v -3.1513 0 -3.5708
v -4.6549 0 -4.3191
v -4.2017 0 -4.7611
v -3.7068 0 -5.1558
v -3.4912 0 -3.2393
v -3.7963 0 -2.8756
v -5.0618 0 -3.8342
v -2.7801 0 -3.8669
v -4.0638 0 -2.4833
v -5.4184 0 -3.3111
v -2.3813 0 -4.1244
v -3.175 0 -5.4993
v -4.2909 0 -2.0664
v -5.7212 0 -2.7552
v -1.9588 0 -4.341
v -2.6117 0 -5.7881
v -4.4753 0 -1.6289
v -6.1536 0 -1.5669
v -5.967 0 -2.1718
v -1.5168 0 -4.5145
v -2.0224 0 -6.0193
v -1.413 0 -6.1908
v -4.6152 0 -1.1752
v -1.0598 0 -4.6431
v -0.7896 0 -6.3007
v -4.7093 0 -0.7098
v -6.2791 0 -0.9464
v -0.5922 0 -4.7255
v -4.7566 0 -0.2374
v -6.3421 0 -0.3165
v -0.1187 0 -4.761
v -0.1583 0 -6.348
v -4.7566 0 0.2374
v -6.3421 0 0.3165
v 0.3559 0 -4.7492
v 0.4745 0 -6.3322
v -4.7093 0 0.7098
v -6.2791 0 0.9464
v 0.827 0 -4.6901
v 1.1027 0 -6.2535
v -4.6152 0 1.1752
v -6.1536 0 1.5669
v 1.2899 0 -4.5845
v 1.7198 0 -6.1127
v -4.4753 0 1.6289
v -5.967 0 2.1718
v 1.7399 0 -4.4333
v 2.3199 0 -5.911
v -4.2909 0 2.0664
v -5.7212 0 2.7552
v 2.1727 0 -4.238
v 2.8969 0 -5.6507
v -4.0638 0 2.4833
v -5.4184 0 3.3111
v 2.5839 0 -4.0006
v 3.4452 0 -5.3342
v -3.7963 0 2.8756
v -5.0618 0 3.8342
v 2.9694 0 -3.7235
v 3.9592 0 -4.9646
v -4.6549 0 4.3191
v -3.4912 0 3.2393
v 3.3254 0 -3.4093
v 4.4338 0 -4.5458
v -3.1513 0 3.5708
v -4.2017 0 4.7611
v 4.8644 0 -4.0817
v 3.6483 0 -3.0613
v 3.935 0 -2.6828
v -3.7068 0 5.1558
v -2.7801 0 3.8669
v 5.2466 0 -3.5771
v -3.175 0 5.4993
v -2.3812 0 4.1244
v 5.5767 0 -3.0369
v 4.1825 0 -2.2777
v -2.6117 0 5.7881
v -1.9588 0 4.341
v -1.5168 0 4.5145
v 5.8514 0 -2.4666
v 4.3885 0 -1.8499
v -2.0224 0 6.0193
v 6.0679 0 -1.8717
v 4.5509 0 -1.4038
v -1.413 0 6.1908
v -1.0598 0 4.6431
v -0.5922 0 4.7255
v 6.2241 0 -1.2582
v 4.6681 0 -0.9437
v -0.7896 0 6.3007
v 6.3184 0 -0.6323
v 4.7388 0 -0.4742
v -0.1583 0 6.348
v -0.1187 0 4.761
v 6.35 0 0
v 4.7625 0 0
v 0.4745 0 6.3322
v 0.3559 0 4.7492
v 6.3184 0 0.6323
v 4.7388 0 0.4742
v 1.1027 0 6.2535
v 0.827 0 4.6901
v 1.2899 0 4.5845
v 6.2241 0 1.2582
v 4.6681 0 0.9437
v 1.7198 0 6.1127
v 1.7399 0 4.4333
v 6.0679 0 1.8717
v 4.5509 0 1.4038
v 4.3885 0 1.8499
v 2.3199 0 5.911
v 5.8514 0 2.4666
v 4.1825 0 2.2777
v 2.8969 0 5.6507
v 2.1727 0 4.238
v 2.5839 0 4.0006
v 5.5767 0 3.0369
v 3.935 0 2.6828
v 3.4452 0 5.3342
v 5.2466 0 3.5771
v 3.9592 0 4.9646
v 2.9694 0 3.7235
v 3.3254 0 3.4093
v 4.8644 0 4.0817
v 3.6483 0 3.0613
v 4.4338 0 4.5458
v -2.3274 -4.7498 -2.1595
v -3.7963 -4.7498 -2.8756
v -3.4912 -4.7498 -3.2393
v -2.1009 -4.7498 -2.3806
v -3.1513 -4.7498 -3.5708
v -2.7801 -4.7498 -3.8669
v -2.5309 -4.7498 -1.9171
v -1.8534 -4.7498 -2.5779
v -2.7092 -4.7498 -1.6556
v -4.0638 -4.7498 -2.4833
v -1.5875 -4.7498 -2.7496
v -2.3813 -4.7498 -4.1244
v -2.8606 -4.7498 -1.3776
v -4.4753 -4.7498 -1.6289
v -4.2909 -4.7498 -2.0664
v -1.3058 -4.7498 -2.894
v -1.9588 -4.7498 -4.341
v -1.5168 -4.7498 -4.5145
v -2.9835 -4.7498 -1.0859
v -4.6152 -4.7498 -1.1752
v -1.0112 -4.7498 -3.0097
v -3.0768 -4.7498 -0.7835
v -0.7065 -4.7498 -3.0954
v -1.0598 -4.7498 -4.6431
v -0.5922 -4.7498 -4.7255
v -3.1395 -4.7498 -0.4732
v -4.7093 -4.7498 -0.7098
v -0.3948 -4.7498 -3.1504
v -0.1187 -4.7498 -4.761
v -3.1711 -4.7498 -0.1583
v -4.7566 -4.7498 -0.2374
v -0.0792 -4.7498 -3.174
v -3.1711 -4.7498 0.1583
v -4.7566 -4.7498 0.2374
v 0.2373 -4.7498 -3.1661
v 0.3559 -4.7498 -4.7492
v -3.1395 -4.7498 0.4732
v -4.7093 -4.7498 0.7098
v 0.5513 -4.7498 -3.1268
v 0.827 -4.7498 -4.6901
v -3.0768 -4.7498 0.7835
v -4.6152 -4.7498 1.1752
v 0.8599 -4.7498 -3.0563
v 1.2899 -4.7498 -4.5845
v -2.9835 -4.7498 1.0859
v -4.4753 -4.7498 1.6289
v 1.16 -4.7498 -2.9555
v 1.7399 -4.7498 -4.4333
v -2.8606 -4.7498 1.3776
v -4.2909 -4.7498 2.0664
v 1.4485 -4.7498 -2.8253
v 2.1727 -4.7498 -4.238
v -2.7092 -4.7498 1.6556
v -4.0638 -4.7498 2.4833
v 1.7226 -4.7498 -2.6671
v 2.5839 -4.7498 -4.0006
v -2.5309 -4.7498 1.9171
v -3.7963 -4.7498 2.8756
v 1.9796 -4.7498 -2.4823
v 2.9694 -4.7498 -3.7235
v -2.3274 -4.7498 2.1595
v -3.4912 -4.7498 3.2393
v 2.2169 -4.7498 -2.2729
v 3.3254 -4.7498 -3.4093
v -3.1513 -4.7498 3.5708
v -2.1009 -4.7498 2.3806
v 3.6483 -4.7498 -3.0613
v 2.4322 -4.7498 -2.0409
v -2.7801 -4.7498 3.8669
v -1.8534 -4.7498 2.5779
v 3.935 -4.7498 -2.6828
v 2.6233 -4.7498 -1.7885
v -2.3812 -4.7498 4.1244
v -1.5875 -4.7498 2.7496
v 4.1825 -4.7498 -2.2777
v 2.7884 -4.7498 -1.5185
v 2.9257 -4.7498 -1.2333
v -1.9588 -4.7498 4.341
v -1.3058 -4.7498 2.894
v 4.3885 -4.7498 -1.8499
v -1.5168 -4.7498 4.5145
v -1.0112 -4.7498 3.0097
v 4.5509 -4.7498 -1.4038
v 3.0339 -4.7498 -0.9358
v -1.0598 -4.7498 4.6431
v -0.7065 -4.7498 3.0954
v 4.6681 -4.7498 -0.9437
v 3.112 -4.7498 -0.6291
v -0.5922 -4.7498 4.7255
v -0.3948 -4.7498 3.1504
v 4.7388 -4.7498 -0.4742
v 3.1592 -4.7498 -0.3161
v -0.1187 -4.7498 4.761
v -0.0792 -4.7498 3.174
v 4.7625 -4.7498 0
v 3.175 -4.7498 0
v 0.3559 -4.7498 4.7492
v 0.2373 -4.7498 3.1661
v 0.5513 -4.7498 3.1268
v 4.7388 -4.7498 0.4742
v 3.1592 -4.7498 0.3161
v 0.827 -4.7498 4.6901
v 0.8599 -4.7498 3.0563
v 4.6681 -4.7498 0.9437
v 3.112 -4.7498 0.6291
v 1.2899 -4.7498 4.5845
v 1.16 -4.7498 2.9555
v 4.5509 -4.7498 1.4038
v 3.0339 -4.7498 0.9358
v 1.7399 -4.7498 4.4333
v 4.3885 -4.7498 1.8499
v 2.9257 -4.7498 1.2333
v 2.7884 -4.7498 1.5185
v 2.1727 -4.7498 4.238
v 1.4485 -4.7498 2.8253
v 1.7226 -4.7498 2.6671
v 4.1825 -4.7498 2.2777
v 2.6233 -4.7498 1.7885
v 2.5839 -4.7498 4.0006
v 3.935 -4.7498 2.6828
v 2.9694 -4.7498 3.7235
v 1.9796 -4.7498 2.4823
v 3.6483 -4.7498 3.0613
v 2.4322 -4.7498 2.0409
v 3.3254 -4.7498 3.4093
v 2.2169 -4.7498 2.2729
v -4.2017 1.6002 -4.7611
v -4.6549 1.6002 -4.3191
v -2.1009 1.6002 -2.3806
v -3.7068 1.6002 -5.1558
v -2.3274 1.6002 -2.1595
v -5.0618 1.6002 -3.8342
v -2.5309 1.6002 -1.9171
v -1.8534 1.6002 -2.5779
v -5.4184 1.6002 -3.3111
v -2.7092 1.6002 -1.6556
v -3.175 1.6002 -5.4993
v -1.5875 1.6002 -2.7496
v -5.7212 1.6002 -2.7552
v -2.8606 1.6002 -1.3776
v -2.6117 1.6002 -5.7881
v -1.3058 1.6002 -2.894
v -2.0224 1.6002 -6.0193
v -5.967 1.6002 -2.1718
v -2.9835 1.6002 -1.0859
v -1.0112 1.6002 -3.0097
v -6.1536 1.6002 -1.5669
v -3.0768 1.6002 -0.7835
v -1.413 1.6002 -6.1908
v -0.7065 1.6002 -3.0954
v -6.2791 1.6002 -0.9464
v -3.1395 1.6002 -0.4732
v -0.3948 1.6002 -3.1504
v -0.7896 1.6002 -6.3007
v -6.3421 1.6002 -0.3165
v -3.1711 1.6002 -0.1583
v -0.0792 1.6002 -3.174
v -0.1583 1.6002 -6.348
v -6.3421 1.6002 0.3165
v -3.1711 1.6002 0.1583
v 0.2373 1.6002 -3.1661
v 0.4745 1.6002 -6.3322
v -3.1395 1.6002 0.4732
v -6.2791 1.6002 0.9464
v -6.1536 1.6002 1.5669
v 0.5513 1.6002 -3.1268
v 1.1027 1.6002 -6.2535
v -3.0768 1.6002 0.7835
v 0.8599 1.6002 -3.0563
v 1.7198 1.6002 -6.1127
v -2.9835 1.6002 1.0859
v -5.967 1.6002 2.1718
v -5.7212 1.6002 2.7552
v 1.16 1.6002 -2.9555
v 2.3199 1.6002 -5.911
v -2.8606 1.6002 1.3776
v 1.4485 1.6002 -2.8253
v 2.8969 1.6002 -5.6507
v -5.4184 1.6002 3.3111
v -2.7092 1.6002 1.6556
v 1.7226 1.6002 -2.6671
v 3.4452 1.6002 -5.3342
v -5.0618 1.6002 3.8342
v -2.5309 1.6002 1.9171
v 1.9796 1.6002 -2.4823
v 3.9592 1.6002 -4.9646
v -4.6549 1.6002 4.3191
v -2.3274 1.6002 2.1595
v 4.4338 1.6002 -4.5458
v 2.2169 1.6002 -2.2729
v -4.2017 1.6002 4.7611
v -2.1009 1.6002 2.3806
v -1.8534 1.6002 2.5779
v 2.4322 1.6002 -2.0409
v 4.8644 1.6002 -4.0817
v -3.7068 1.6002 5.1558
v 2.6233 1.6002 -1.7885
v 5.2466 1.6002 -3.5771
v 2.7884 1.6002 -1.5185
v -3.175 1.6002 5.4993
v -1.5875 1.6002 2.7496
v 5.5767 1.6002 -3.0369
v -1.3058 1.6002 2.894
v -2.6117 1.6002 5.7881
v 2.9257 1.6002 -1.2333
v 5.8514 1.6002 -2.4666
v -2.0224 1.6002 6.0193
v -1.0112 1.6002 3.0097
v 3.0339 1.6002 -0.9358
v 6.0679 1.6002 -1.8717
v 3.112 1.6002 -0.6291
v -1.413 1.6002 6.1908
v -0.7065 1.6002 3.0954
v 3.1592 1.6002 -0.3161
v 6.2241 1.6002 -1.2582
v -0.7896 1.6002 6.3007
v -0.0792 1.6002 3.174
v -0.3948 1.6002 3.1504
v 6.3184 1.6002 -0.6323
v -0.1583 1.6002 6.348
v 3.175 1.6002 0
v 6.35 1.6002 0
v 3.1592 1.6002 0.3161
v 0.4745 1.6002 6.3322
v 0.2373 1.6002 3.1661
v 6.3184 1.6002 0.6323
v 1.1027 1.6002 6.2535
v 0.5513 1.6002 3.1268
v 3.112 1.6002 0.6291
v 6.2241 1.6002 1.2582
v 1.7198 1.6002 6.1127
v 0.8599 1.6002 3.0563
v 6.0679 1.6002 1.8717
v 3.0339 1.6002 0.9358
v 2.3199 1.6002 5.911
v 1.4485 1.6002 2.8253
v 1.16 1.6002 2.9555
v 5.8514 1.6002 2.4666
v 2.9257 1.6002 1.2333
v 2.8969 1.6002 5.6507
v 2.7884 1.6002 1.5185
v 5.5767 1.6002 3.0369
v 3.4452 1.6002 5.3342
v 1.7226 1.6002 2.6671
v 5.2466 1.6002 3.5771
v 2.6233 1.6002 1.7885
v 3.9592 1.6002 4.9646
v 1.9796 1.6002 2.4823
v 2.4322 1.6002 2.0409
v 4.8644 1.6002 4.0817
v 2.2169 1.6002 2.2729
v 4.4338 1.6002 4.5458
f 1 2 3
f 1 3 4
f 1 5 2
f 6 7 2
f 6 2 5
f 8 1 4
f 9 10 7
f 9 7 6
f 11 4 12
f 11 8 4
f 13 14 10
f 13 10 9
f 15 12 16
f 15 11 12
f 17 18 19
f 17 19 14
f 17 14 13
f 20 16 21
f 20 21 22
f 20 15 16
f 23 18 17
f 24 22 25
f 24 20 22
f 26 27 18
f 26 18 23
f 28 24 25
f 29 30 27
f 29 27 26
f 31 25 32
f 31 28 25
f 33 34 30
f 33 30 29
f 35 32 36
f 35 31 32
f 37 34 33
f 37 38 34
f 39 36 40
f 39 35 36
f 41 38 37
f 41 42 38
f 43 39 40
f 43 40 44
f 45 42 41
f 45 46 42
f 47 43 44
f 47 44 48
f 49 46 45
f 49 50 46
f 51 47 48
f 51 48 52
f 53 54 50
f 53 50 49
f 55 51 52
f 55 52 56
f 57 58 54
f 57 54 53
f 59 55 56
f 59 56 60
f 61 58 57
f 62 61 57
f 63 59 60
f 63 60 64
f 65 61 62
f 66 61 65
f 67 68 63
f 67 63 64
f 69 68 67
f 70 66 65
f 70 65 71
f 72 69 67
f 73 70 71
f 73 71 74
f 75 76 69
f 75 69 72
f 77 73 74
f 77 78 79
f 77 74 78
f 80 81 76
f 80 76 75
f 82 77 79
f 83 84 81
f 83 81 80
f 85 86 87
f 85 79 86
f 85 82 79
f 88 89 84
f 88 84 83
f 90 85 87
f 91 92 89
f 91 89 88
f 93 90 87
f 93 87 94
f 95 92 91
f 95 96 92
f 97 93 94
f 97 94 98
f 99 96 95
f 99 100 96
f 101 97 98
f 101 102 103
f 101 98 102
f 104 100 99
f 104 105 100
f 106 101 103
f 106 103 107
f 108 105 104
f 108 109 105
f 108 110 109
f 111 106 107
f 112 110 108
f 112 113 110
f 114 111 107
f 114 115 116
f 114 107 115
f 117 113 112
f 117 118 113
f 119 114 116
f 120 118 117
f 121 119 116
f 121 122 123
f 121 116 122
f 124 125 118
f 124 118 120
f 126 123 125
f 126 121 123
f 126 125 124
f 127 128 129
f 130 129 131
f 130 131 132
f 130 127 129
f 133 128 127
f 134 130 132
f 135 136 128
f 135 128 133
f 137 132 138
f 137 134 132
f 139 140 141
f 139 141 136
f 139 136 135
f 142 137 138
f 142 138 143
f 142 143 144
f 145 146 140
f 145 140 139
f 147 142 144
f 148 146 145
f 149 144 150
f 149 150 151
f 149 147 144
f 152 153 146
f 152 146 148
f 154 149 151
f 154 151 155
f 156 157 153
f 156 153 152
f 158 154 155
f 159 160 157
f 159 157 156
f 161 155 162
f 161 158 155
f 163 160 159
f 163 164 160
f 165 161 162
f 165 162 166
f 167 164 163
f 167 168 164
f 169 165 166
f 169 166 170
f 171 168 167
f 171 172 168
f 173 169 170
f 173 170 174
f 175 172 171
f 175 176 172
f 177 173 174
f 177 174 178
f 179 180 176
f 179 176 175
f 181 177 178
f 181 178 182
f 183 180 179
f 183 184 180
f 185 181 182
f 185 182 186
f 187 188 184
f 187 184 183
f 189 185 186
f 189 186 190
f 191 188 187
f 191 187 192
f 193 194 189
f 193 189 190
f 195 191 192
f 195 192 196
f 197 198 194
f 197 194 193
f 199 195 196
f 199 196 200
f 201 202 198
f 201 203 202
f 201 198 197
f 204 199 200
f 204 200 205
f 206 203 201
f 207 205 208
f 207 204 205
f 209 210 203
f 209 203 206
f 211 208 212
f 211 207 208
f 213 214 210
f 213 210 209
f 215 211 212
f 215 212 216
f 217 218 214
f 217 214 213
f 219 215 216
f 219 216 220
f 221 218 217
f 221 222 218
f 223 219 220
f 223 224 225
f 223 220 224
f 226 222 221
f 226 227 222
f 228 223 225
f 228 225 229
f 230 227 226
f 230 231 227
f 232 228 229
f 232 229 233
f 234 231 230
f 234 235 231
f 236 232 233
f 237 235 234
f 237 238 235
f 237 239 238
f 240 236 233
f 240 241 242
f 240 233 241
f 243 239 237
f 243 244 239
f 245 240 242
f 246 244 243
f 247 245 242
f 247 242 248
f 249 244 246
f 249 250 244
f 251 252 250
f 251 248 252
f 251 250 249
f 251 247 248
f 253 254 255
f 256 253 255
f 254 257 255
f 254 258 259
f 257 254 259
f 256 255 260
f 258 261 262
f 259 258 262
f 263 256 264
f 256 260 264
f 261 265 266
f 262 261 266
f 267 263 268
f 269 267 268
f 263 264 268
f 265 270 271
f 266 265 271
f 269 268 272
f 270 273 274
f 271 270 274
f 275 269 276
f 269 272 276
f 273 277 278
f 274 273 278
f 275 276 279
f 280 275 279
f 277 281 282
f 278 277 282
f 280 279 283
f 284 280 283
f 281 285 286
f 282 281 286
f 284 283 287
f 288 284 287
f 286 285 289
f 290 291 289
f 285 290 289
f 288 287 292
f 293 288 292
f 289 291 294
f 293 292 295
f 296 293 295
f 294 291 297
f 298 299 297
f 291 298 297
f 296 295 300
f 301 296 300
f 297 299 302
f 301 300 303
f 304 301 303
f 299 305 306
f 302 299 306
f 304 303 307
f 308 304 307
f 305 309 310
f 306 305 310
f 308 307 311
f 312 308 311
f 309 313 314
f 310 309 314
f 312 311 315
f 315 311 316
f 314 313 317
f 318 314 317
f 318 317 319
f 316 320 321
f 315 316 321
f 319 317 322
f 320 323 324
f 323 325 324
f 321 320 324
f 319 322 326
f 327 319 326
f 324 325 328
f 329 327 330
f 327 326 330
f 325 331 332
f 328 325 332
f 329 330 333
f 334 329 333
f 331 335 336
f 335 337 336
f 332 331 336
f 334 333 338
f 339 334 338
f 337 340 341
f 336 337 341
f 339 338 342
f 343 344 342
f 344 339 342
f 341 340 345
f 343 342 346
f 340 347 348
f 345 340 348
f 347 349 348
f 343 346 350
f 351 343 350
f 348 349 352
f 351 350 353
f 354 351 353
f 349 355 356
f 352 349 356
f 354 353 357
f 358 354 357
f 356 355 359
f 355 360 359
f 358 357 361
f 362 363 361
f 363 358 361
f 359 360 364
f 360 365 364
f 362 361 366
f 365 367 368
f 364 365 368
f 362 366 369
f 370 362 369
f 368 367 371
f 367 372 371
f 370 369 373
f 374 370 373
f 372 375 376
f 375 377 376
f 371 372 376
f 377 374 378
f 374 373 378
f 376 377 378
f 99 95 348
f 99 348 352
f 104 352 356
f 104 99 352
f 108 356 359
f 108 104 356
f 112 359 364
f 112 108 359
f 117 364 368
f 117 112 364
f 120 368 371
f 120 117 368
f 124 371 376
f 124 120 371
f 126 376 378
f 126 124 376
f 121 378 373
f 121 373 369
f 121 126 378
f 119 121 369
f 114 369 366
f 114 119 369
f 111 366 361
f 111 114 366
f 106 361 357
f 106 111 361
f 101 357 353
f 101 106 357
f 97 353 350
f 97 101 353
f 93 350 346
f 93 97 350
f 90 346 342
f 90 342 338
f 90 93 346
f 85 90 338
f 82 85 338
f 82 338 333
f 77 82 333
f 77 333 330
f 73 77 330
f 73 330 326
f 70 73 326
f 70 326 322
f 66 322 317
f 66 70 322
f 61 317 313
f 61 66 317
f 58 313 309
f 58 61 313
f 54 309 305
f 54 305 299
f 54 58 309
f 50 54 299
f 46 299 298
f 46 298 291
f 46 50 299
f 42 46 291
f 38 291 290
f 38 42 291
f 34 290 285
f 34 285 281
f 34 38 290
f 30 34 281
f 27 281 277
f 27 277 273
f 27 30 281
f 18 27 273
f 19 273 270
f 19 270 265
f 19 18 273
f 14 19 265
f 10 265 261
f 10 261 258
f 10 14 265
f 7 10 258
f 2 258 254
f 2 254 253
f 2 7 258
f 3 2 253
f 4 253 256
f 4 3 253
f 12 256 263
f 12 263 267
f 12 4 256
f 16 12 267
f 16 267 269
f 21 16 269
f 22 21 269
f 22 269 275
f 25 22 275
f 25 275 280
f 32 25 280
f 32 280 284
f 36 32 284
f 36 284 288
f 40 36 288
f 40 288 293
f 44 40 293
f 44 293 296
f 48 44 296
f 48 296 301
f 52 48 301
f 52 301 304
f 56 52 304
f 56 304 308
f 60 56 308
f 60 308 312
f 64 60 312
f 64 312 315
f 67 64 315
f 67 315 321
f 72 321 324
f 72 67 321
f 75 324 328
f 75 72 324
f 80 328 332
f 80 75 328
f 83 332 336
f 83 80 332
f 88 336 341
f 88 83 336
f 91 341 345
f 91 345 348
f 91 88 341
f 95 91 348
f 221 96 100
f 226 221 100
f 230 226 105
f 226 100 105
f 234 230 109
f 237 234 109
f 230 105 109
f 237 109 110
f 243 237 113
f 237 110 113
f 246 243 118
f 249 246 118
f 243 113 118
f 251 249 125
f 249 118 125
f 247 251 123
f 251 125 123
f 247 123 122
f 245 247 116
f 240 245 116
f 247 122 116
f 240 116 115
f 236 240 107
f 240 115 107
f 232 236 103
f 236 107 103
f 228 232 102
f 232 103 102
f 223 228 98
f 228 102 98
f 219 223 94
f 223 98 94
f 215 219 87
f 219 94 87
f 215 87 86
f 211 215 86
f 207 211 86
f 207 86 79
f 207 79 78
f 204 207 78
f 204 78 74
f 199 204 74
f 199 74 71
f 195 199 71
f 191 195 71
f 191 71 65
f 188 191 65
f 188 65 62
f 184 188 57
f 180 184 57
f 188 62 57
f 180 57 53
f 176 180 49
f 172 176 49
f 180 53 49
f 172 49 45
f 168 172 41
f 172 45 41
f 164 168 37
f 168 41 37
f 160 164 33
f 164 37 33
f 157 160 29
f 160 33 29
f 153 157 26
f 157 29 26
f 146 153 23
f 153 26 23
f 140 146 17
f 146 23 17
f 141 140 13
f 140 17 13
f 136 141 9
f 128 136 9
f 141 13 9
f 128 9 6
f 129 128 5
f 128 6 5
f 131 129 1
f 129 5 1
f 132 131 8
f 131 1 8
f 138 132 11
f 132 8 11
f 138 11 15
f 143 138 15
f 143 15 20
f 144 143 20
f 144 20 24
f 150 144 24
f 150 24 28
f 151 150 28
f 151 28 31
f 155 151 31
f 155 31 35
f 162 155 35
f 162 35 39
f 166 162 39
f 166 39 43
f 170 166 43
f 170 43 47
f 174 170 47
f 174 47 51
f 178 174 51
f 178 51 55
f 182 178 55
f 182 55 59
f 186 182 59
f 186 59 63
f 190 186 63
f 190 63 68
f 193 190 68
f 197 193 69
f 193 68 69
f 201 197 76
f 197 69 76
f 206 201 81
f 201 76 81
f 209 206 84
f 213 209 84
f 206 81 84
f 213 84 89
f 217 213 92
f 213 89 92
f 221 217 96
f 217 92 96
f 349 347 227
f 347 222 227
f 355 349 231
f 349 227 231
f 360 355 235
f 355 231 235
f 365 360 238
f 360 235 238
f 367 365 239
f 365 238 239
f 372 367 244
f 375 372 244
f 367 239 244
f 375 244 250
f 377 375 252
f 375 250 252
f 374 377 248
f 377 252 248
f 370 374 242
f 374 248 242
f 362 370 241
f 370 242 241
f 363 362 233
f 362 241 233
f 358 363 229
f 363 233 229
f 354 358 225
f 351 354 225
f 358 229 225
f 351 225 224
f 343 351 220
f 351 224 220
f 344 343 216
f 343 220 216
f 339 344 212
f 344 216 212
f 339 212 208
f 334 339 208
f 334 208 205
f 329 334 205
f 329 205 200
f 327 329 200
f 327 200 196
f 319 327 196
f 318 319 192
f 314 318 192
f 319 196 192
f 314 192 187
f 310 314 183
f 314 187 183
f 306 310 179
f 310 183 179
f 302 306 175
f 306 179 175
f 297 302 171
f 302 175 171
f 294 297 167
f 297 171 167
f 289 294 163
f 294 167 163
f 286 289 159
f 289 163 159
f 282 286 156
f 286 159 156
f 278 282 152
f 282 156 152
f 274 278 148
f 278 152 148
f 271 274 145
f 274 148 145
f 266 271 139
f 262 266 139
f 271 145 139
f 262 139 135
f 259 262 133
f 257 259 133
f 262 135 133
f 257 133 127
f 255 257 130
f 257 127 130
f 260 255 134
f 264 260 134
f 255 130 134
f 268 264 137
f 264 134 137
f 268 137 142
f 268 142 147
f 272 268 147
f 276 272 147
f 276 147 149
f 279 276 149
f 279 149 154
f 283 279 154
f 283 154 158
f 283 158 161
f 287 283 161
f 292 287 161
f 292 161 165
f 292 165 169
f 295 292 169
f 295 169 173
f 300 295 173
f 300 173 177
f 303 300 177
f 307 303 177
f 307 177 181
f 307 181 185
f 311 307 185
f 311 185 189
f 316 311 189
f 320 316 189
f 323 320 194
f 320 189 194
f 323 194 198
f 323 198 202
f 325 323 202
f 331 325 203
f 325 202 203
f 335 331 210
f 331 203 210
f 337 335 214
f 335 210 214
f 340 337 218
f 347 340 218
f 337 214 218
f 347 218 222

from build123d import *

# Parameters (mm, degrees)
F0_R     = 6.35
F1_DEPTH = 1.6002
F2_R     = 4.7625
F3_DEPTH = 4.7498
F4_R     = 3.175
F5_DEPTH = 12.7


with BuildPart() as f1:
    # F0 (on Front) → F1 (new body)
    with BuildSketch(Plane.XZ):
        Circle(F0_R)
    extrude(amount=-F1_DEPTH)

    # F2 (on face) → F3 (join)
    with BuildSketch(Plane.XZ):
        Circle(F2_R)
    extrude(amount=F3_DEPTH)

    # F4 (on face) → F5 (cut, symmetric)
    with BuildSketch(Plane.XZ):
        Circle(F4_R)
    extrude(amount=F5_DEPTH, both=True, mode=Mode.SUBTRACT)


solid = f1.part
